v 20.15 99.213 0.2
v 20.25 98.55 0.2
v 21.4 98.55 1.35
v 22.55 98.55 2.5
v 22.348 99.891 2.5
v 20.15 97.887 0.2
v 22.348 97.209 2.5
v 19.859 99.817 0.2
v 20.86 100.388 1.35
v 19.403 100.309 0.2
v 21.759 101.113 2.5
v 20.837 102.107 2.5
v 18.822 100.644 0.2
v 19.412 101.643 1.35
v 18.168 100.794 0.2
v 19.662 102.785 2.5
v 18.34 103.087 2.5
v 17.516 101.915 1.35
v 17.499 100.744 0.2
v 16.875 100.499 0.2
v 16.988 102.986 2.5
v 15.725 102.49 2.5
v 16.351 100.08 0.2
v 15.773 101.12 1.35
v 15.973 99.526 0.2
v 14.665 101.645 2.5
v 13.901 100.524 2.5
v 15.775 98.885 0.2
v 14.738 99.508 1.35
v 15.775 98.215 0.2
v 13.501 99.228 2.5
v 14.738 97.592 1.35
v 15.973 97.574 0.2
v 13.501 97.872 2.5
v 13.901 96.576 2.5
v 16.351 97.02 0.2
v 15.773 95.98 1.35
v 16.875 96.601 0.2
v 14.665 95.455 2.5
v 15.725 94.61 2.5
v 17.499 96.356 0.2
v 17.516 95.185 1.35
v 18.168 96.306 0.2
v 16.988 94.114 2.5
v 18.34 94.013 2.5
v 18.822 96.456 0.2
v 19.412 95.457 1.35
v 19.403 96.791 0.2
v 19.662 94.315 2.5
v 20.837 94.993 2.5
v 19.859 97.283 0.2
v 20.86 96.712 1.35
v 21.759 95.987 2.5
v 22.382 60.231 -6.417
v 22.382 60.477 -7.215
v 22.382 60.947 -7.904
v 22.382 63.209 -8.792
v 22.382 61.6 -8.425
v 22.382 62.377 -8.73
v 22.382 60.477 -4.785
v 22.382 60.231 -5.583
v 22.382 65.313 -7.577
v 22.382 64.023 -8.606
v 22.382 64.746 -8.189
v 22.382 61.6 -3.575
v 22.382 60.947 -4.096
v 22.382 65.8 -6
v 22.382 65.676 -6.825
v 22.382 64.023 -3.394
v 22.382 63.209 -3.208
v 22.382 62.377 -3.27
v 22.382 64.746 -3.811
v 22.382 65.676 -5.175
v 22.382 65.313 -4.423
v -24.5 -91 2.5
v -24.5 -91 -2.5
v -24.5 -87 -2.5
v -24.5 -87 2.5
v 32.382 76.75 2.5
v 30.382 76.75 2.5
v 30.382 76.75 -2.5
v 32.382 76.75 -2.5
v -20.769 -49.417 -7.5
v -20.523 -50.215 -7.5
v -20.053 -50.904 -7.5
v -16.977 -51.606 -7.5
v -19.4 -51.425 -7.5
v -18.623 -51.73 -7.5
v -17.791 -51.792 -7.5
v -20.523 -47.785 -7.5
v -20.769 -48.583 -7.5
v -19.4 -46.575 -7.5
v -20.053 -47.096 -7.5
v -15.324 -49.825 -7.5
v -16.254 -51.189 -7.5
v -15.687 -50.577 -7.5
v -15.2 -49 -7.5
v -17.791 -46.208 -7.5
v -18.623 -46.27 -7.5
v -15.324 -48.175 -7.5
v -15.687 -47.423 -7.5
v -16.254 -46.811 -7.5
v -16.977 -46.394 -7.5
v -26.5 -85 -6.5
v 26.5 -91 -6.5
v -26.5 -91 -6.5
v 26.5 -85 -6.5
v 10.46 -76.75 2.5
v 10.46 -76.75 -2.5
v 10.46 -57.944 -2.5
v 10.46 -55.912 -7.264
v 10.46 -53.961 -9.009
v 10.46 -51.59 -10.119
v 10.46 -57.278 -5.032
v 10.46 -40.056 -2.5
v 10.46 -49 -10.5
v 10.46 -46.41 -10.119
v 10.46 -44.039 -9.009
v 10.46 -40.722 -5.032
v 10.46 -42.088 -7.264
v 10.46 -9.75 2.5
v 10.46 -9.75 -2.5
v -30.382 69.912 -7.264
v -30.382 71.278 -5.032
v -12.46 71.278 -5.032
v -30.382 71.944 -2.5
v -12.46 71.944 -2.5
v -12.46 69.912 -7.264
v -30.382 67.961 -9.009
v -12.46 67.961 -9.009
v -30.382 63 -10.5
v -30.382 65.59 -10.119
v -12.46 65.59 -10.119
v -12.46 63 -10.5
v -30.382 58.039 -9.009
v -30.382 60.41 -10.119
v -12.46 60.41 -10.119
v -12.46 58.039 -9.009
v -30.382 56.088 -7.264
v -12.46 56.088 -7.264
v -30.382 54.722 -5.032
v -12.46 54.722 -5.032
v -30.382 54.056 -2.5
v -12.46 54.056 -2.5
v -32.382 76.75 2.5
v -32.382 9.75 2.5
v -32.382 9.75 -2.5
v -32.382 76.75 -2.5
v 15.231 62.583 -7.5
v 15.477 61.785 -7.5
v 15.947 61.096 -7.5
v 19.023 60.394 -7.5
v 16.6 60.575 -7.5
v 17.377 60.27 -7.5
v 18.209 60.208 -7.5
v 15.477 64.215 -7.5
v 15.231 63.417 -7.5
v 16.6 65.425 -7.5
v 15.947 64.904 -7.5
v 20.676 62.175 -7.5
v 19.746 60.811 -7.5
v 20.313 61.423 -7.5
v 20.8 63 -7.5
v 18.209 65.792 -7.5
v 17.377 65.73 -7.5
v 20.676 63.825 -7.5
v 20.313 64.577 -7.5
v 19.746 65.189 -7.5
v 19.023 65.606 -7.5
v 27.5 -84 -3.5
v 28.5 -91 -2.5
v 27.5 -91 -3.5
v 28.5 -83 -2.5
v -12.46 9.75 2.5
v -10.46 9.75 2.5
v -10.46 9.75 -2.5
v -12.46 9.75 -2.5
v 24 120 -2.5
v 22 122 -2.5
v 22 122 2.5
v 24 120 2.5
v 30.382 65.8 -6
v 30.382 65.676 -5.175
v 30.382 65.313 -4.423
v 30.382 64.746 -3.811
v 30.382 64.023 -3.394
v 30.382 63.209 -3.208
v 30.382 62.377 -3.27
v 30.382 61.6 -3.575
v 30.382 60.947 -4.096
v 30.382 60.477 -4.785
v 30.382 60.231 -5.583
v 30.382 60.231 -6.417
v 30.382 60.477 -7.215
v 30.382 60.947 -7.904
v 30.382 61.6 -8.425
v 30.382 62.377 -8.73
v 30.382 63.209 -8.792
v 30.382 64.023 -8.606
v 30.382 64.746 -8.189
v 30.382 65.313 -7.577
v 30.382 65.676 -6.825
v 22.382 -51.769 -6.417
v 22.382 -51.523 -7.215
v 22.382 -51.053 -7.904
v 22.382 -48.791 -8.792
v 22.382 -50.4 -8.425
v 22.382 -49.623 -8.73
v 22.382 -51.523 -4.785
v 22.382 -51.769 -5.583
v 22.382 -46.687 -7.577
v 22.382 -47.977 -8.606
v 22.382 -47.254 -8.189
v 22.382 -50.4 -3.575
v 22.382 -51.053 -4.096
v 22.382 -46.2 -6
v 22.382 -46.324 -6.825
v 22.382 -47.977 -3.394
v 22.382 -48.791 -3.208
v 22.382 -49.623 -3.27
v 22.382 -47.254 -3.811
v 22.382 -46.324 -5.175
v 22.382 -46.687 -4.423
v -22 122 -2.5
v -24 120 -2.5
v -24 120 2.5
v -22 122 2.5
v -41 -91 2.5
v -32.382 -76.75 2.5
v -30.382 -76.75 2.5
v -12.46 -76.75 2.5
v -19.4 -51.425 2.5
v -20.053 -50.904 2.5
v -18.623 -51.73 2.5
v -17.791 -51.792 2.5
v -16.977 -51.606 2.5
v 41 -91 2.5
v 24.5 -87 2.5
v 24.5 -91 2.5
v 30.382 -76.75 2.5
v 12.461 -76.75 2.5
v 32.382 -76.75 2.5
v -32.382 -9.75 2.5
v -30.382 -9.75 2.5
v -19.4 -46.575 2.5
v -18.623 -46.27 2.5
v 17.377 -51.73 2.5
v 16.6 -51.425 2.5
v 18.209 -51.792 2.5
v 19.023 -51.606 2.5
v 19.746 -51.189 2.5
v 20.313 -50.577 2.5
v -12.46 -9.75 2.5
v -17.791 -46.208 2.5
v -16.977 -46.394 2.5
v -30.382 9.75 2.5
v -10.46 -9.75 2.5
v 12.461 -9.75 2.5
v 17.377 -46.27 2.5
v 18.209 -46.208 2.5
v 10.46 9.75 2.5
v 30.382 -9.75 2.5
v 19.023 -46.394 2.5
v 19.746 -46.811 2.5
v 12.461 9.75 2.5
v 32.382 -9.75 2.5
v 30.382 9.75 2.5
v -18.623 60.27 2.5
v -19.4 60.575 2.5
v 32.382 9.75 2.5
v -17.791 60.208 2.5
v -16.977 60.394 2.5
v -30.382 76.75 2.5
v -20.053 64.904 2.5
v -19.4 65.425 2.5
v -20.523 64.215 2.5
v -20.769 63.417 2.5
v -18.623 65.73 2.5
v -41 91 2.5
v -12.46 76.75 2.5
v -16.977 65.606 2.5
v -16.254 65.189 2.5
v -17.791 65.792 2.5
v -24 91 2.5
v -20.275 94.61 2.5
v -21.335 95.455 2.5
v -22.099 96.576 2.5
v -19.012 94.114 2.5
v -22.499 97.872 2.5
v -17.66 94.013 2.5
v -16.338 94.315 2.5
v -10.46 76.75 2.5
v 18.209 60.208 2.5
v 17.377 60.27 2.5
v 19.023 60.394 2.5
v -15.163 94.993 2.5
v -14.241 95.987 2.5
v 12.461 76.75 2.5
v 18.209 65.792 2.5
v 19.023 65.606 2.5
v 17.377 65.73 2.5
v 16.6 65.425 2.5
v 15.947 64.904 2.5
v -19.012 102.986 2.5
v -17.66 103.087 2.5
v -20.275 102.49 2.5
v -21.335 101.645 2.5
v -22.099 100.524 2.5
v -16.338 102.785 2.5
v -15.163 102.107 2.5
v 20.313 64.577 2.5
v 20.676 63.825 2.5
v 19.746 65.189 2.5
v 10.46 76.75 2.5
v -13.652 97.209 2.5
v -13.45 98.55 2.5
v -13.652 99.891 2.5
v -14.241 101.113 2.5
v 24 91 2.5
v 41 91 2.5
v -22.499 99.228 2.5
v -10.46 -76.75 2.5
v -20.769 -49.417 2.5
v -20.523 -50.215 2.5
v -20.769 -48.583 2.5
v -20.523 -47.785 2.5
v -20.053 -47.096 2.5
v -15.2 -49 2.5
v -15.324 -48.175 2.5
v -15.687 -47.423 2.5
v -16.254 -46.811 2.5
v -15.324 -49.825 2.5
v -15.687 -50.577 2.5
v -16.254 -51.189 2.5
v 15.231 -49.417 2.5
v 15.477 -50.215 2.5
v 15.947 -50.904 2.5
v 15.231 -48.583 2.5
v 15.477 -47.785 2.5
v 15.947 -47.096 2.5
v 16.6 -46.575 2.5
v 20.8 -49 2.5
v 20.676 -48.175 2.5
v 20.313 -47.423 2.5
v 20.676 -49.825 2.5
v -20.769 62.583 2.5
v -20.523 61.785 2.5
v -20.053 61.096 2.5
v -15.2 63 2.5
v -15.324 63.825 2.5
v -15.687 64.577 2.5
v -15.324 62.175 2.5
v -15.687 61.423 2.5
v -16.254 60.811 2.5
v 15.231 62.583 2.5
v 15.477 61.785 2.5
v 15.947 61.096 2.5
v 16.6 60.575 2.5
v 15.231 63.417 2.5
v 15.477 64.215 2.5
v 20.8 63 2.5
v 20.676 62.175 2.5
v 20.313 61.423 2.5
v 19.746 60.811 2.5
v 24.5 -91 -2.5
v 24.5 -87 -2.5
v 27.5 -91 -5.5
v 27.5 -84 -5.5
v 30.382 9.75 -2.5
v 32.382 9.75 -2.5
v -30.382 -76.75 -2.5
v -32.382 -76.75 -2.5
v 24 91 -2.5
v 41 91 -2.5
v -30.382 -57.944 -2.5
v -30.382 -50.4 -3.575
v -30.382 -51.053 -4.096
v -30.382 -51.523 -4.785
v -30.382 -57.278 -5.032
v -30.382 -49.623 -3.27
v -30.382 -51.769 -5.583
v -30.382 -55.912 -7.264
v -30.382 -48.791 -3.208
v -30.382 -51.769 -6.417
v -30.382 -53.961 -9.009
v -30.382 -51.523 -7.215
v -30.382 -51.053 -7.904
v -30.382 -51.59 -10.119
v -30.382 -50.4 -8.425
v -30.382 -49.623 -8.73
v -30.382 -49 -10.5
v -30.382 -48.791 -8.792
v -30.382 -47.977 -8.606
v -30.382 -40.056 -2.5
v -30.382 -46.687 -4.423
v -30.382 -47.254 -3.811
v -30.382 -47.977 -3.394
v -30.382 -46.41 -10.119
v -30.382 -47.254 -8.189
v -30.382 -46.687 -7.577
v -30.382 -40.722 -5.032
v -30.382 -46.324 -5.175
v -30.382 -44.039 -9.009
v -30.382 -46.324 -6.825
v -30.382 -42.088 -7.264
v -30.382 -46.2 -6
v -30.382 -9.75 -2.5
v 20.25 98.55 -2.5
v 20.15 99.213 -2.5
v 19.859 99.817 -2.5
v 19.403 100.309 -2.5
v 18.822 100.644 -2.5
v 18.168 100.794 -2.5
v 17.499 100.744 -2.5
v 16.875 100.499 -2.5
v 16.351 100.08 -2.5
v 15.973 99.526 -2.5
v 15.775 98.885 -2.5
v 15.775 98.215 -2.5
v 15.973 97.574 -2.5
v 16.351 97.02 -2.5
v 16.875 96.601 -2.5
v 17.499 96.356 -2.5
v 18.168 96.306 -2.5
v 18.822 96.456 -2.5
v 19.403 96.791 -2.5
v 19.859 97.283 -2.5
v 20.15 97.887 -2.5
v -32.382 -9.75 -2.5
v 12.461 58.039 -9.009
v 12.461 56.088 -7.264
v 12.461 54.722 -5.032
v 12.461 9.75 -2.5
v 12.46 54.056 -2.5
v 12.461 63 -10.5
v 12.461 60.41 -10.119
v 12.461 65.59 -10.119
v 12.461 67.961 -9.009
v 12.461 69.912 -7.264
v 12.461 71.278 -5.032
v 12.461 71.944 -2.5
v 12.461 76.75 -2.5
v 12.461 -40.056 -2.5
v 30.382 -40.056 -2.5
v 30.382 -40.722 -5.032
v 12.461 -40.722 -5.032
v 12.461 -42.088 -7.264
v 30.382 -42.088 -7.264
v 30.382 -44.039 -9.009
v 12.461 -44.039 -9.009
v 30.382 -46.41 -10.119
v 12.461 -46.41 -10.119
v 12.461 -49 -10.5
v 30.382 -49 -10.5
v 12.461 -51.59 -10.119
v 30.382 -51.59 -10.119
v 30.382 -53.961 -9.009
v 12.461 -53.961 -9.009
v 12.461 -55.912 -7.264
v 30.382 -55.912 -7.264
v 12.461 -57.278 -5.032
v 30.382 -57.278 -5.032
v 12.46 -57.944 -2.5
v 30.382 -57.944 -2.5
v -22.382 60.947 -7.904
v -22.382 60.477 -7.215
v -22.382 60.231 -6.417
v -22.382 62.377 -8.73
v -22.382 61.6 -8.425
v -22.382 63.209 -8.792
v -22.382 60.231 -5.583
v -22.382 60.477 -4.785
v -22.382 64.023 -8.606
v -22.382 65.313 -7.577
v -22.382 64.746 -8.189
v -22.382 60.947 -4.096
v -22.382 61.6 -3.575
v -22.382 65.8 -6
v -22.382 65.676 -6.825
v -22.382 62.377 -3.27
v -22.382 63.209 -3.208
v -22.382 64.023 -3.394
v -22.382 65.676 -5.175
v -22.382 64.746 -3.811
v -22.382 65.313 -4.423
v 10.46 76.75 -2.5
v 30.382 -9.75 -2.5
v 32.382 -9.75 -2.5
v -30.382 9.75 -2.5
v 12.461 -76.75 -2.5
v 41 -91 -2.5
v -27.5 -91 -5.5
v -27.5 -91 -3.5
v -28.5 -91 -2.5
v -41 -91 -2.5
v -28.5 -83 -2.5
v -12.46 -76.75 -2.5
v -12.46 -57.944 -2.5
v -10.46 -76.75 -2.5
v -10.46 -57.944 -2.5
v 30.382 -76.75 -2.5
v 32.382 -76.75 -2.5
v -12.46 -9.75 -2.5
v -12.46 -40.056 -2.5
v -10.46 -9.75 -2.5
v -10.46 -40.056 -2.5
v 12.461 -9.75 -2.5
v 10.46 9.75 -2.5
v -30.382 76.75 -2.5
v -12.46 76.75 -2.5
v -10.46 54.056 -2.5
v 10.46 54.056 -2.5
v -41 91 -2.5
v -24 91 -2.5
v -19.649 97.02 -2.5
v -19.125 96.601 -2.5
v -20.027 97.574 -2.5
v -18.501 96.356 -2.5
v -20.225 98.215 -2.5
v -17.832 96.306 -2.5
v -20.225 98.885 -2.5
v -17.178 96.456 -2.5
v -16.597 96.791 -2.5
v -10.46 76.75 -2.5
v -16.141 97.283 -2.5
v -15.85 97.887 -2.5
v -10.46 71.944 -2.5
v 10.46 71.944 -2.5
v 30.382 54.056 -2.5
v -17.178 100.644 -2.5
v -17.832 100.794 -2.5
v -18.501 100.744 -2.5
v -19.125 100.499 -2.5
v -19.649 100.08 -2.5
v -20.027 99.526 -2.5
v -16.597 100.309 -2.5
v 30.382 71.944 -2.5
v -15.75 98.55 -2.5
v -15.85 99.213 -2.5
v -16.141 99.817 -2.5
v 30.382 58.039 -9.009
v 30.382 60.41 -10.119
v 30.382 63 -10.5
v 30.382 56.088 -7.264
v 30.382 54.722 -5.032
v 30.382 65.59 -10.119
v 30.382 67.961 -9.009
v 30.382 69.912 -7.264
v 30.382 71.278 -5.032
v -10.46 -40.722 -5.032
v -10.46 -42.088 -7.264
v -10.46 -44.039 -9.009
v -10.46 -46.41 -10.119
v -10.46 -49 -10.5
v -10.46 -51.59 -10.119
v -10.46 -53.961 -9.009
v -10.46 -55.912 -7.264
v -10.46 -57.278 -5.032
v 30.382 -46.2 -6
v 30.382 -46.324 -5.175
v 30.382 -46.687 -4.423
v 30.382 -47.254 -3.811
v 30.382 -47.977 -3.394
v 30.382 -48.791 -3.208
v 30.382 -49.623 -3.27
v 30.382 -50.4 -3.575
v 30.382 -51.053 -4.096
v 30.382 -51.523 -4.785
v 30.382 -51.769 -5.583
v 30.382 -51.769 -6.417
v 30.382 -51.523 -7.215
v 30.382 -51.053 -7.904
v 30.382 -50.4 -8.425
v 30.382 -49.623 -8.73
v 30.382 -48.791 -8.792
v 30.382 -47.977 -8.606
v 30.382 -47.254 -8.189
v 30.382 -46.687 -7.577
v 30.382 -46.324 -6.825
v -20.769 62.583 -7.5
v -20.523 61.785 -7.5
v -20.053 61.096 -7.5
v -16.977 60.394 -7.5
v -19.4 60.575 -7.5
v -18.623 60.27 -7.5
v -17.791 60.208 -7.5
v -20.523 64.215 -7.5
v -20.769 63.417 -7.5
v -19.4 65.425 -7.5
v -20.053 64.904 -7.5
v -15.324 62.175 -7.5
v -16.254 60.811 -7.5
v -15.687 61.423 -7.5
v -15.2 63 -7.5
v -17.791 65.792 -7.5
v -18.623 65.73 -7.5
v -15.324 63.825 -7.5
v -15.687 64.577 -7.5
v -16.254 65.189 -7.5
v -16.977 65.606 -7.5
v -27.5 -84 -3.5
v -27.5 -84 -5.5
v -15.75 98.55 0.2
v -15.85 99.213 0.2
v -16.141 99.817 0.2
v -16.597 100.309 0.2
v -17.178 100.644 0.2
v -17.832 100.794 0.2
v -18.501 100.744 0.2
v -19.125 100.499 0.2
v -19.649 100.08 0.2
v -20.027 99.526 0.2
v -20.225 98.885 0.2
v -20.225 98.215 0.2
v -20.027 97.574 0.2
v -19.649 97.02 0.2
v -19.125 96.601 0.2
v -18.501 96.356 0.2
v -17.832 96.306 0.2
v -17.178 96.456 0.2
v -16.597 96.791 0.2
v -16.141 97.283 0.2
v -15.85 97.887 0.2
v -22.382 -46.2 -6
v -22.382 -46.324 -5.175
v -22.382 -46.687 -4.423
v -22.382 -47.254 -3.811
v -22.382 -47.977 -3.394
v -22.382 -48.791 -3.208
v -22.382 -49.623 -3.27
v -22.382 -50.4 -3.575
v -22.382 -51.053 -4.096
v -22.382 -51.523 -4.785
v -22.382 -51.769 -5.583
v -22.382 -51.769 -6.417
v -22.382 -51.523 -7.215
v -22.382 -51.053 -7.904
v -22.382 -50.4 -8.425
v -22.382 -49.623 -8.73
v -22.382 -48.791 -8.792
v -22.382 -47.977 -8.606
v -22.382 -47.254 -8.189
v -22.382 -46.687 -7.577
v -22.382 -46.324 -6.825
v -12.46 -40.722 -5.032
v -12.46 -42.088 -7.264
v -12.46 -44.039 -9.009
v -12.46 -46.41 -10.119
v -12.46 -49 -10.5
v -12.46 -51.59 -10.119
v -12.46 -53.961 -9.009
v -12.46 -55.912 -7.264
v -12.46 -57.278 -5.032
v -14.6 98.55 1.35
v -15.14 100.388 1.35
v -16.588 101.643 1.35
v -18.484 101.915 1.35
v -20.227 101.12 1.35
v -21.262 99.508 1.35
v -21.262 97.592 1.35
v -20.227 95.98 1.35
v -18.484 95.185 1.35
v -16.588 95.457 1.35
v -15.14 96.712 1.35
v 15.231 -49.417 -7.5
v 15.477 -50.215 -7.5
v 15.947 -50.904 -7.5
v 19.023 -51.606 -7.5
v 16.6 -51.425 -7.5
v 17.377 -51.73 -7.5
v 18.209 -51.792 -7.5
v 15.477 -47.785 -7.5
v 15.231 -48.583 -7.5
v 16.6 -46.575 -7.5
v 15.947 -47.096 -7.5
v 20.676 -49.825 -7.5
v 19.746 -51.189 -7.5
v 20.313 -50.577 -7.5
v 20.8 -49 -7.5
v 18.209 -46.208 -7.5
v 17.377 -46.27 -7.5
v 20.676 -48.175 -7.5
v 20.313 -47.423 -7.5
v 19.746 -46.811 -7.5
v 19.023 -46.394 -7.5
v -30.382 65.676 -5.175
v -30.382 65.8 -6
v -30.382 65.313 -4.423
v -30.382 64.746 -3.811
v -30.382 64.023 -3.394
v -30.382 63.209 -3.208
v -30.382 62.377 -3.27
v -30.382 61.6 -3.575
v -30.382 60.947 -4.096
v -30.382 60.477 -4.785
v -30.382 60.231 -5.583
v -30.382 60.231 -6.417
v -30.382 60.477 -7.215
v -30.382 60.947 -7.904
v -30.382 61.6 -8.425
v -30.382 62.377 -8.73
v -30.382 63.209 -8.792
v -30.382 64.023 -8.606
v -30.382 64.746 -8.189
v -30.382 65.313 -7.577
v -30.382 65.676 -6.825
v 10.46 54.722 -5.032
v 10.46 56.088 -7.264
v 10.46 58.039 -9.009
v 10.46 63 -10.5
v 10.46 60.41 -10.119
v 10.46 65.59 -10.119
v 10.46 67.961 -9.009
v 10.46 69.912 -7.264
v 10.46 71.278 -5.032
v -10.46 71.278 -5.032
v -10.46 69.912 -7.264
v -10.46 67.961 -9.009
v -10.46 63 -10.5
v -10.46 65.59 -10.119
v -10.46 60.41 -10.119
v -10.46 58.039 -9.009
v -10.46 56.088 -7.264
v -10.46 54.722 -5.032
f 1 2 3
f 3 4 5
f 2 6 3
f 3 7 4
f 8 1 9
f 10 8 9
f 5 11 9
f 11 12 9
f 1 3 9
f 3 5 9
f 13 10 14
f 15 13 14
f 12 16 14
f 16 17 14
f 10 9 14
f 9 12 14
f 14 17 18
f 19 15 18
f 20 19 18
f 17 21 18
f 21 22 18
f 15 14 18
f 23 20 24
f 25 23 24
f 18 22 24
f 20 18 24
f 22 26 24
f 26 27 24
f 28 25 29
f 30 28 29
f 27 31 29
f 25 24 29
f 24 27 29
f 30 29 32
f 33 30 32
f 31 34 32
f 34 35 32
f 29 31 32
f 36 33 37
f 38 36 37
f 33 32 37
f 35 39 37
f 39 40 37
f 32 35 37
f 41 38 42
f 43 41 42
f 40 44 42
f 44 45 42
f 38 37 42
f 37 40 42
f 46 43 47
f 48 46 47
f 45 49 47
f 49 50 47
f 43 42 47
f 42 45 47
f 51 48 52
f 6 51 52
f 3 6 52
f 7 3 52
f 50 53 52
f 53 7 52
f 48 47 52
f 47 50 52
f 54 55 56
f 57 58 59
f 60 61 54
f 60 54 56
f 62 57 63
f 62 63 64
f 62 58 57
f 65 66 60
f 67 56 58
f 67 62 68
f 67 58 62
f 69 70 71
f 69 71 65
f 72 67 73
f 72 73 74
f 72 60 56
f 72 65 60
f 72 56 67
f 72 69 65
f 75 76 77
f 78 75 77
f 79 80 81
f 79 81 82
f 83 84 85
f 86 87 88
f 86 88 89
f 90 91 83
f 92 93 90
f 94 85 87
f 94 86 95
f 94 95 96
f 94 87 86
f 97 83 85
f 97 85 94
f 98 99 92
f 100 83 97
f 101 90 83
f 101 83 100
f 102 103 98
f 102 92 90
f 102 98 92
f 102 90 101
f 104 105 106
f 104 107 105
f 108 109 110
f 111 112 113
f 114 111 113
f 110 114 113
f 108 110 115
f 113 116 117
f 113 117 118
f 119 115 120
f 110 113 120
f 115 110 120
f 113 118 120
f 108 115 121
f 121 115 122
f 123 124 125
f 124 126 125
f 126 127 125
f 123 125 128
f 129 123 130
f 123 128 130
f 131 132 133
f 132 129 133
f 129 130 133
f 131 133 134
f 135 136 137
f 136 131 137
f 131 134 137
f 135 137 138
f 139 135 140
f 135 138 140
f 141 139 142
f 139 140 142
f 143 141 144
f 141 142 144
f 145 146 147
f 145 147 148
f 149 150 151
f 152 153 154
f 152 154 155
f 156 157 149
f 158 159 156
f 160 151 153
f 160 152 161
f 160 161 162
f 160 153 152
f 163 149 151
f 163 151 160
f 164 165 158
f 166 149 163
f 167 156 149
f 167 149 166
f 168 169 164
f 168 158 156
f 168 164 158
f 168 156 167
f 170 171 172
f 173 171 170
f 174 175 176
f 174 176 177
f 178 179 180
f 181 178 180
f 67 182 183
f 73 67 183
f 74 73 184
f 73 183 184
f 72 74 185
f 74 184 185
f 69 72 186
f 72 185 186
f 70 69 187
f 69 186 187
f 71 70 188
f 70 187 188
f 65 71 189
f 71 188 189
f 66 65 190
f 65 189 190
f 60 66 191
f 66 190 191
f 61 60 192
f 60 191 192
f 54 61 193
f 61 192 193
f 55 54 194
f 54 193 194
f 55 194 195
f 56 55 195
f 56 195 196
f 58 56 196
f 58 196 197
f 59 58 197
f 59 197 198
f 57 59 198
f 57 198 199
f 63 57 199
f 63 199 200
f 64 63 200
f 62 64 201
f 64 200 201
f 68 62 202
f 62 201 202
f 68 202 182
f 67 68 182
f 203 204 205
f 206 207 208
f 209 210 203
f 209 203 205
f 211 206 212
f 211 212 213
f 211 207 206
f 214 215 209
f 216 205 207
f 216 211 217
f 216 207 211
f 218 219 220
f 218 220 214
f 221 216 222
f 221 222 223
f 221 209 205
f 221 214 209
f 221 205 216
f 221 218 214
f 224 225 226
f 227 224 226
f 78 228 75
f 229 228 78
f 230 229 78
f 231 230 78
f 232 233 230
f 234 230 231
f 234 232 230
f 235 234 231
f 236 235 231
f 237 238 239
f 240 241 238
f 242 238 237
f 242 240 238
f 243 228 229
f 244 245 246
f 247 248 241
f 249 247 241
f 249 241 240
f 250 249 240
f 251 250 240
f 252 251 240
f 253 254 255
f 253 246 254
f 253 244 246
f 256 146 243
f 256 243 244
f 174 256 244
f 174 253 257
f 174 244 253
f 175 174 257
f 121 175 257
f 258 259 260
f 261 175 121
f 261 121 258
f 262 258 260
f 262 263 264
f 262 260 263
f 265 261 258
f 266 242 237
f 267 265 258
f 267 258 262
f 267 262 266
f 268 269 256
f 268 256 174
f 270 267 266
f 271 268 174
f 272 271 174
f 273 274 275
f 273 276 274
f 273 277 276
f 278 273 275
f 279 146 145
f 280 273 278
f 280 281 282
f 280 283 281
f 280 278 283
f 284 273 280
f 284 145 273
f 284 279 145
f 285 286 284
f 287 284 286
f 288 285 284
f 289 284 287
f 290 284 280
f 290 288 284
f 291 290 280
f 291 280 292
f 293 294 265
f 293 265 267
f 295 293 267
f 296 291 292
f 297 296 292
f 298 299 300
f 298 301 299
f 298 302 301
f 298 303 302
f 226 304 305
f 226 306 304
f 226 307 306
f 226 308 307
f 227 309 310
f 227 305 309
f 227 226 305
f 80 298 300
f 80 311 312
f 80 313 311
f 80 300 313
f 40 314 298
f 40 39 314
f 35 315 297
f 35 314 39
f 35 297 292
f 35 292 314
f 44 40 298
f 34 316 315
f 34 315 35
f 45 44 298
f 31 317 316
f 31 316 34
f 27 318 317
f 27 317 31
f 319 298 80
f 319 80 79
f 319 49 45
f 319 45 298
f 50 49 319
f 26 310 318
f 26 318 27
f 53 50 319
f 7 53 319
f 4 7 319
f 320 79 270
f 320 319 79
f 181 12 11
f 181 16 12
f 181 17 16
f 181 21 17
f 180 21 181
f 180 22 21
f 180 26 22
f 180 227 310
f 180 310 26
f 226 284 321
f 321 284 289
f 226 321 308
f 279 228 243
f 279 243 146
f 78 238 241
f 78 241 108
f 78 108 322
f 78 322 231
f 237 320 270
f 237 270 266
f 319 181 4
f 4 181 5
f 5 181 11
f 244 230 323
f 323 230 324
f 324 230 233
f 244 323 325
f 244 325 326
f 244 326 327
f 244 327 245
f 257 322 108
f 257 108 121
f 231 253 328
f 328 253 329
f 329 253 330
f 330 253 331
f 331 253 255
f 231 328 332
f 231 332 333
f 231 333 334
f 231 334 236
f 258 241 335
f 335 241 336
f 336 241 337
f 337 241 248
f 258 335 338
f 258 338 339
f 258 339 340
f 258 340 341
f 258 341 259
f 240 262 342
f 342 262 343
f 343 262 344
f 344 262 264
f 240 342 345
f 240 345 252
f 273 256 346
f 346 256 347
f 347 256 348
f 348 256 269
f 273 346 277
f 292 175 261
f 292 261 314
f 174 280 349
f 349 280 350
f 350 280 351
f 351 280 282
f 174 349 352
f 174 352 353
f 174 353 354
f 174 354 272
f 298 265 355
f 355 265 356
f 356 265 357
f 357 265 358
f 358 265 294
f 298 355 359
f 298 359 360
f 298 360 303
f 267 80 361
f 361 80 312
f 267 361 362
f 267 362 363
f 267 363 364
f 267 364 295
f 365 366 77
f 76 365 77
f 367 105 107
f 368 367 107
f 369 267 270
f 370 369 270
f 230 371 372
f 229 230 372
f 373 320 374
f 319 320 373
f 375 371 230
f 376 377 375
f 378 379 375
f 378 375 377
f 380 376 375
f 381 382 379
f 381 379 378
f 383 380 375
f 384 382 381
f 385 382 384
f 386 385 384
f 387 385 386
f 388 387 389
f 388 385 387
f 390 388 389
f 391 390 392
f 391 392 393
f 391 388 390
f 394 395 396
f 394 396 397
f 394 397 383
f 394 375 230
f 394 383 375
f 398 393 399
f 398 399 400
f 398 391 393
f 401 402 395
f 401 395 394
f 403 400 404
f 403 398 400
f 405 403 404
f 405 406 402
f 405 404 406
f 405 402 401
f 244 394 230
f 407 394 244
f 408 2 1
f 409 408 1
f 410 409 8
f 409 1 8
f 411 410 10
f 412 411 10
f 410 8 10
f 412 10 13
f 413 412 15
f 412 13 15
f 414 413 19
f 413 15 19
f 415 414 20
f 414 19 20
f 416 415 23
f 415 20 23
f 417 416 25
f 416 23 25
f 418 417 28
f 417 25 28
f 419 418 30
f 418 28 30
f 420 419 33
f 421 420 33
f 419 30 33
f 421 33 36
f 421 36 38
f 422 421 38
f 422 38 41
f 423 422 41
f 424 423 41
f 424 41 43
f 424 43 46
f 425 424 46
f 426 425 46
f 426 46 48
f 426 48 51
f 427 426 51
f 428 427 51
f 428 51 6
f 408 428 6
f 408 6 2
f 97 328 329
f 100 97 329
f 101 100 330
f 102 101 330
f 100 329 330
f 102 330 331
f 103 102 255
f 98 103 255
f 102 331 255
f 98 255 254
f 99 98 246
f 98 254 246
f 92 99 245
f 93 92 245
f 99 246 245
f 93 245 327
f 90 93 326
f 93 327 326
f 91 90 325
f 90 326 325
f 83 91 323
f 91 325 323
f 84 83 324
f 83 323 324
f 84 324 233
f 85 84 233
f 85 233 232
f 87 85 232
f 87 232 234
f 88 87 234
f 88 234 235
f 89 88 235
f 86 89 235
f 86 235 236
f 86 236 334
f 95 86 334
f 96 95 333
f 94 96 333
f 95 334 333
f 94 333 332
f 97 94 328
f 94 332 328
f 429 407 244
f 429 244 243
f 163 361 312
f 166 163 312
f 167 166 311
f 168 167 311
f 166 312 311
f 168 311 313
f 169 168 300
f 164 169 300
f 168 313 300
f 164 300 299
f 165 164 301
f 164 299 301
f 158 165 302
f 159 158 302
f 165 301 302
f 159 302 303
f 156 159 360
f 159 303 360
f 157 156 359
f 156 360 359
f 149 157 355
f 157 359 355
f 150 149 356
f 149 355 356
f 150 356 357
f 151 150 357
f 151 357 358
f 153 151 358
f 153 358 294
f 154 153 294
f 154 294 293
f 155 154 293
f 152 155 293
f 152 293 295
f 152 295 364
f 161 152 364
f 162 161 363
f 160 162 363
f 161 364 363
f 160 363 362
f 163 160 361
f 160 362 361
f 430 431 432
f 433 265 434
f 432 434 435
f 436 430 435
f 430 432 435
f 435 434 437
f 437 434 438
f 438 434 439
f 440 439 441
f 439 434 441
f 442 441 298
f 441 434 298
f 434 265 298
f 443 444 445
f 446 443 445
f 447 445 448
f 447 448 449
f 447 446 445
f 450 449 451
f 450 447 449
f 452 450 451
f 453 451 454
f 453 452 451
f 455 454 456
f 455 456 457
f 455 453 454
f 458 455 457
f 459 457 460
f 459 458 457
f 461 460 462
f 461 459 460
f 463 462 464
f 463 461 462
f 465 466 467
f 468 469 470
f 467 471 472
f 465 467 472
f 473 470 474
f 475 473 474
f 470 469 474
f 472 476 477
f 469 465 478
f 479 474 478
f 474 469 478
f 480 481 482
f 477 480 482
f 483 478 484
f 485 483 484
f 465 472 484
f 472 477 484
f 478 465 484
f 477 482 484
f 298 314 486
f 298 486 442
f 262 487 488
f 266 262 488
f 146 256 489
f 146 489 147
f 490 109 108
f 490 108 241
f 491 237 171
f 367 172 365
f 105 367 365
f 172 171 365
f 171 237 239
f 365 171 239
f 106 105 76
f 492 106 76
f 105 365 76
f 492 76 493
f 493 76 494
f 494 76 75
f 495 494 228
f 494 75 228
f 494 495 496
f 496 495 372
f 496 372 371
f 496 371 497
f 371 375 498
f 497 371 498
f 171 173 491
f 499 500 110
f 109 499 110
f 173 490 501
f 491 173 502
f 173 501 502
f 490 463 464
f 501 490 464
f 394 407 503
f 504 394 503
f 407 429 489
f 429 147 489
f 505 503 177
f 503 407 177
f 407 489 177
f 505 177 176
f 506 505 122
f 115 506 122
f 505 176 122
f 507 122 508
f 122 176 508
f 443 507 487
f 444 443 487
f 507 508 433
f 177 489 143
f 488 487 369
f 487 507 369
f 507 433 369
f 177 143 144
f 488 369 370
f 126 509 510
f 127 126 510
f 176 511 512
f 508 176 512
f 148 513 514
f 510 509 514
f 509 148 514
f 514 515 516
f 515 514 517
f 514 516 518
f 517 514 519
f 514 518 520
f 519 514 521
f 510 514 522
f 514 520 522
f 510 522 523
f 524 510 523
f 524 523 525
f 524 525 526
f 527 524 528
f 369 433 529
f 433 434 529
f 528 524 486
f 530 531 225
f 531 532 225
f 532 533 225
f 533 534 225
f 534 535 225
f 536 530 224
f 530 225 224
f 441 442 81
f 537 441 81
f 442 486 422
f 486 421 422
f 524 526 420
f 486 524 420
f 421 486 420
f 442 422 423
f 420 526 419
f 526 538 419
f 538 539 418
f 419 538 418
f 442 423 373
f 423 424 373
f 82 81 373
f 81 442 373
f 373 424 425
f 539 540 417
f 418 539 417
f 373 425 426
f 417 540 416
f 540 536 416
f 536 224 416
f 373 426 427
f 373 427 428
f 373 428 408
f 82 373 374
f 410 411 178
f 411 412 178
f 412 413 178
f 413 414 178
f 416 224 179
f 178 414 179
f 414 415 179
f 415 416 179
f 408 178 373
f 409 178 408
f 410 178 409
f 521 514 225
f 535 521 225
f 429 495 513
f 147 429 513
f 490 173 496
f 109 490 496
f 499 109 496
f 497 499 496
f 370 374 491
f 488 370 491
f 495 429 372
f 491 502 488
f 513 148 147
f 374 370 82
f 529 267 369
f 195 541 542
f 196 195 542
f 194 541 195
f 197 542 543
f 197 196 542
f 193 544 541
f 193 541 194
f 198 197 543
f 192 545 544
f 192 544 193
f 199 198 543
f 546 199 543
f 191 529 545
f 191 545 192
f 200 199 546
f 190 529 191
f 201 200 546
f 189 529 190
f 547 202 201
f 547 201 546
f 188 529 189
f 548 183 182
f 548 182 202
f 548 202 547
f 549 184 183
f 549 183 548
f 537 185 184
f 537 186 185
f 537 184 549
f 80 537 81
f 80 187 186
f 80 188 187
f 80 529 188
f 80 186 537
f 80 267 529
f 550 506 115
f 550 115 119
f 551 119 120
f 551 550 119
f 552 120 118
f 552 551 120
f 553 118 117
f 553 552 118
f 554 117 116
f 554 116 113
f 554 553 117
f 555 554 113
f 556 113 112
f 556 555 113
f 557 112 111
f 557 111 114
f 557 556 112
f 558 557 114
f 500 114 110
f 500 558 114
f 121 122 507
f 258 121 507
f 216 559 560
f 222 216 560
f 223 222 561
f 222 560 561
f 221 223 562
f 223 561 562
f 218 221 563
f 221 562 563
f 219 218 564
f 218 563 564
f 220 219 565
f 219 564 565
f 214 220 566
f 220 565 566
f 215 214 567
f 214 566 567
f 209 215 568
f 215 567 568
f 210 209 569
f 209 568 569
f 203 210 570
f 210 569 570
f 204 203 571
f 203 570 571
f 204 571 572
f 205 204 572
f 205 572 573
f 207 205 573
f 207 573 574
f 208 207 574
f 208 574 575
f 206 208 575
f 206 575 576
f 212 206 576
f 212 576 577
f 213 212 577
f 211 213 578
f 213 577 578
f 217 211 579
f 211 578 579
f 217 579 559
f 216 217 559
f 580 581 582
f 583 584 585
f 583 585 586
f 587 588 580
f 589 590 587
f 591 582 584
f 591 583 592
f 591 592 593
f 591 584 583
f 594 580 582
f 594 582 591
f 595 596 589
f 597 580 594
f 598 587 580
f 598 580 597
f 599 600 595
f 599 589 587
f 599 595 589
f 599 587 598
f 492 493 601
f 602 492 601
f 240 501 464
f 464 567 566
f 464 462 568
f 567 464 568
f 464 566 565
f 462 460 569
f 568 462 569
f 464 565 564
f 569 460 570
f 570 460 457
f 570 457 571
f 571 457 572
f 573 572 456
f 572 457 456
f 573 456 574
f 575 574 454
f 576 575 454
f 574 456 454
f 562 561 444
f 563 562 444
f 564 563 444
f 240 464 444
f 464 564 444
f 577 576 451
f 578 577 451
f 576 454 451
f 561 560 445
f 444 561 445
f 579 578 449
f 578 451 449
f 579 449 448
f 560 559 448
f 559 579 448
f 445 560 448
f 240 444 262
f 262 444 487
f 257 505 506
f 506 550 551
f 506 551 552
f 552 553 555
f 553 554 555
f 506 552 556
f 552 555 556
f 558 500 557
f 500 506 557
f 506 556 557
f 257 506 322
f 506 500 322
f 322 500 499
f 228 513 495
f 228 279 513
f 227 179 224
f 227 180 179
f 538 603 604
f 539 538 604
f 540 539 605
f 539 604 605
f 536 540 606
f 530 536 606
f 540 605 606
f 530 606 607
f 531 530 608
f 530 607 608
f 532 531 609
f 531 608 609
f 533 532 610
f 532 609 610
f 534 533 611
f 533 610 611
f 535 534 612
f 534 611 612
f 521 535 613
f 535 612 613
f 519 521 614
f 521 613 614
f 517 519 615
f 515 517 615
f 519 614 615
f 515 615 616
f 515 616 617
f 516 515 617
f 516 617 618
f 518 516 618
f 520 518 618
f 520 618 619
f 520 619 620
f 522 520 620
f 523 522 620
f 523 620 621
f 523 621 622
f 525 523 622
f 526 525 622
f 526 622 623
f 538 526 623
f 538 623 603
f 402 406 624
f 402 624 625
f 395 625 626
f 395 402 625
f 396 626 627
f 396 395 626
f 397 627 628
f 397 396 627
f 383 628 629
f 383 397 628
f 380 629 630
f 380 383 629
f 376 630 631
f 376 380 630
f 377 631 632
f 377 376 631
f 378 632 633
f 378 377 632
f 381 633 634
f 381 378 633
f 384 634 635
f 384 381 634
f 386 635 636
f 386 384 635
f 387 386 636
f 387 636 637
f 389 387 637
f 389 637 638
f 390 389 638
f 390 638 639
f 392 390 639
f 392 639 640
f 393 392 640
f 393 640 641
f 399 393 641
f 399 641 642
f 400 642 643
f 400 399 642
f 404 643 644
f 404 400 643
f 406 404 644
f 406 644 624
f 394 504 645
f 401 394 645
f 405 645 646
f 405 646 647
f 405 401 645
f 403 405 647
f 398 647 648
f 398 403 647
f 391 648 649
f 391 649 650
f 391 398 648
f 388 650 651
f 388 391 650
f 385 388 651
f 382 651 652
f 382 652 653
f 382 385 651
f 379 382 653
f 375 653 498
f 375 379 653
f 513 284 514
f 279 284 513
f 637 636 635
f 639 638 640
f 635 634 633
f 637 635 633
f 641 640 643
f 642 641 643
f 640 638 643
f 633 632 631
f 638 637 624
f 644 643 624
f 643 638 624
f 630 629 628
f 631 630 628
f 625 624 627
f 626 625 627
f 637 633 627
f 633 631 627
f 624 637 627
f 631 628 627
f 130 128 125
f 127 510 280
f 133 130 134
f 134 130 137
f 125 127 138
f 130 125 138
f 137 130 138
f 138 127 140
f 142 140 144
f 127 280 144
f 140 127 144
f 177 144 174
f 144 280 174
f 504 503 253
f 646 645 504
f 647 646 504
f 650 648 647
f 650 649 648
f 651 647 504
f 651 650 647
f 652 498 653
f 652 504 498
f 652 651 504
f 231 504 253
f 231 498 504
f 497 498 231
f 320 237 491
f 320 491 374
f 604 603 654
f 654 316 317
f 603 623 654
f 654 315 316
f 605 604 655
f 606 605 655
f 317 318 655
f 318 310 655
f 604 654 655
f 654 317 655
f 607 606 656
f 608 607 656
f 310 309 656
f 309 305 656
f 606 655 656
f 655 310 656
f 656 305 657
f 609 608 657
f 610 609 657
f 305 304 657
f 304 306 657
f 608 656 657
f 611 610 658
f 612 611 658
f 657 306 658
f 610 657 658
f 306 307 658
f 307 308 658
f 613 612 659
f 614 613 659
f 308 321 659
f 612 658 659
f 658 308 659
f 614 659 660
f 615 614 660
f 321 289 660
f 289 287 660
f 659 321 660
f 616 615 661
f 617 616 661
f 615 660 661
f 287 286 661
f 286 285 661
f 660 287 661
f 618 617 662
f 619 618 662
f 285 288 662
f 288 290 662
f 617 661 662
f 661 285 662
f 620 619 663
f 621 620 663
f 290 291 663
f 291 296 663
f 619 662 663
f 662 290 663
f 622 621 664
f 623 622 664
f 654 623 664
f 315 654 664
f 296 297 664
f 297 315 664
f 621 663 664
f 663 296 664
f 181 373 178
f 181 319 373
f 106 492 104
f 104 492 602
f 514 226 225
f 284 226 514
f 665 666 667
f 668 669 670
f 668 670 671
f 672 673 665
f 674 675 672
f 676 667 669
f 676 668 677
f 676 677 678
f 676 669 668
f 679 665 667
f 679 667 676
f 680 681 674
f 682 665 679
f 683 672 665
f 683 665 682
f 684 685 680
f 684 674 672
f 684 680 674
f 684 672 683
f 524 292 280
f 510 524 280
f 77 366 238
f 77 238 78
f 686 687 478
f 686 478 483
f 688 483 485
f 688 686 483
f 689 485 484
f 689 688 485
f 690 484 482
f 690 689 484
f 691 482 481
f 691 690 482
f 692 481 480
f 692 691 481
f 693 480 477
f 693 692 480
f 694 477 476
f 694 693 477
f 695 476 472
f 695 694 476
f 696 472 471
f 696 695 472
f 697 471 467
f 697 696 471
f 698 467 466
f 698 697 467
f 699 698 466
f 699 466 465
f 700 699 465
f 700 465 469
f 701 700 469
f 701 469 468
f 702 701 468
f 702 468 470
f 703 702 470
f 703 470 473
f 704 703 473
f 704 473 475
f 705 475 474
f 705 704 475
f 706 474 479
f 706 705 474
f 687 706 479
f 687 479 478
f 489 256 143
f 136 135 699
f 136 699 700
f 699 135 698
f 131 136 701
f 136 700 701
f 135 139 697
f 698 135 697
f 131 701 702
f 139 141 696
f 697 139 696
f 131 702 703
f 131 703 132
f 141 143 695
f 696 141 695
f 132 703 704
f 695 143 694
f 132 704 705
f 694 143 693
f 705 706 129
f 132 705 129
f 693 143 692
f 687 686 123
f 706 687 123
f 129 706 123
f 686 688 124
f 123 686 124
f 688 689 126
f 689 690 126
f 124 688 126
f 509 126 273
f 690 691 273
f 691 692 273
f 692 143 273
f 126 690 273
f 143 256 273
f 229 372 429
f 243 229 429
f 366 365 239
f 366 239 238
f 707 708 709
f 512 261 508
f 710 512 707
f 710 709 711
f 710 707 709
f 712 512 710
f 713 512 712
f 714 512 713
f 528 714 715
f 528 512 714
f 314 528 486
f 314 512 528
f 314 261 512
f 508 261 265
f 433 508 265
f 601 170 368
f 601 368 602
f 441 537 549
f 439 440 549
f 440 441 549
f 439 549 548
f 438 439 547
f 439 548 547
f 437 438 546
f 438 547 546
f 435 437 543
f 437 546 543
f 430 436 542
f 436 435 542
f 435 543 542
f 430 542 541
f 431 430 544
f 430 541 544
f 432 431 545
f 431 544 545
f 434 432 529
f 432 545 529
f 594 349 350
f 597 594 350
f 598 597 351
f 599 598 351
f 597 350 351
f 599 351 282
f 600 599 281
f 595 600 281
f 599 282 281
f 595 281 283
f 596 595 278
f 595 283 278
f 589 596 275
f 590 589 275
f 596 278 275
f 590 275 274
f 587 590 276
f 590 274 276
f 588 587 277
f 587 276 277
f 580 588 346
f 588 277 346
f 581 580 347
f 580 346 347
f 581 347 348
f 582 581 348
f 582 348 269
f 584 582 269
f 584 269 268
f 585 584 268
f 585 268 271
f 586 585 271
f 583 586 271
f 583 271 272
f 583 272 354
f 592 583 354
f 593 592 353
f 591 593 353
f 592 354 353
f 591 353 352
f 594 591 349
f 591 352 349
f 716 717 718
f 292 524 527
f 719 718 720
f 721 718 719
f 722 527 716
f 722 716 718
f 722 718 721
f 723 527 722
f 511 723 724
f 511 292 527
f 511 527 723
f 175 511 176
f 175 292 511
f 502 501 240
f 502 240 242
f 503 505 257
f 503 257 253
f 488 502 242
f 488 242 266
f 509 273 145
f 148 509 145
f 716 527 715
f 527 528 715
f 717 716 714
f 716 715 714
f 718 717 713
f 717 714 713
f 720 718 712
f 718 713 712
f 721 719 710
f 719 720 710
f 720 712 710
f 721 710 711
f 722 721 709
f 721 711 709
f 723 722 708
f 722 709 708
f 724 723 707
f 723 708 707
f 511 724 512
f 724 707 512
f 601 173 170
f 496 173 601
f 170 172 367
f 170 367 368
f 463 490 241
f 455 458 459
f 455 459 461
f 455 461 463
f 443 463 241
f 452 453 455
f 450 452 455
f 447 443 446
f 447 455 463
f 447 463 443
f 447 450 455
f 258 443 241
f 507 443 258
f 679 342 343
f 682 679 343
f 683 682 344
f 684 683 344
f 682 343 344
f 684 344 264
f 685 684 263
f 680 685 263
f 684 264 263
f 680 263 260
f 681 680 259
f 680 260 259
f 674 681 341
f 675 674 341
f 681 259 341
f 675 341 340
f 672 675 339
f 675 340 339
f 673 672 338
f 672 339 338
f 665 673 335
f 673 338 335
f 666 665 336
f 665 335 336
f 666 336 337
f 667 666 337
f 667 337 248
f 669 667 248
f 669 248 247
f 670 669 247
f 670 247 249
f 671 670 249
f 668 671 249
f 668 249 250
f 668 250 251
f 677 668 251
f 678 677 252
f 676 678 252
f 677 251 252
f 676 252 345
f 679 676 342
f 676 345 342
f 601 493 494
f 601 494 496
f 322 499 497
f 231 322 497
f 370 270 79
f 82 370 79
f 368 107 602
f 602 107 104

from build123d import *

# Parameters (mm, degrees)
BOSS_EXTRU_1_DEPTH              = 2.5
BOSS_EXTRU_2_DEPTH              = 30.59
ESQUISSE5_W                     = 2
ESQUISSE5_H                     = 67
ENL_V_MAT_EXTRU_1_DEPTH         = 130.359962894
ESQUISSE14_W                    = 49
ESQUISSE14_H                    = 4
ENL_V_MAT_EXTRU_5_DEPTH         = 129.953479984
R_P_TITION_LIN_AIRE2_COUNT      = 2
R_P_TITION_LIN_AIRE2_PITCH      = 19.921
ESQUISSE17_R                    = 2.25
ENL_V_MAT_EXTRU_7_DEPTH         = 10
ESQUISSE15_W                    = 55
ESQUISSE15_H                    = 7
BOSS_EXTRU_4_DEPTH              = 4
CHANFREIN3_SIZE                 = 1
CHANFREIN4_SIZE                 = 2
ESQUISSE19_R                    = 2.8
ENL_V_MAT_EXTRU_9_DEPTH         = 8
CHANFREIN5_SIZE                 = 2.3
SYM_TRIE9_COPY_1_SKETCH_W       = 2
SYM_TRIE9_COPY_1_SKETCH_H       = 67
SYM_TRIE9_COPY_1_DEPTH          = 130.359962894
ESQUISSE20_R                    = 2.8
ENL_V_MAT_EXTRU_10_DEPTH        = 10
R_P_TITION_LIN_AIRE3_COUNT      = 2
R_P_TITION_LIN_AIRE3_PITCH      = 36
R_P_TITION_LIN_AIRE3_COUNT_DIR2 = 2
R_P_TITION_LIN_AIRE3_PITCH_DIR2 = 112


with BuildPart() as part:
    # Esquisse1 → Boss.-Extru.1 (new, symmetric)
    with BuildSketch(Plane.XY):
        Polygon((-41, -91), (-15.008, -91), (41, -91), (41, 91), (24, 91), (24, 122), (-24, 122), (-24, 91), (-41, 91), align=None)
    extrude(amount=BOSS_EXTRU_1_DEPTH, both=True)

    # Esquisse6 → Boss.-Extru.2 (add, symmetric)
    with BuildSketch(Plane(origin=(0, 0, 0), x_dir=(0, 0, -1), z_dir=(1, 0, 0))):
        with BuildLine():
            Line((2.5, -57.94427191), (2.5, -40.05572809))
            ThreePointArc((2.5, -40.05572809), (10.5, -49), (2.5, -57.94427191))
        make_face()
        with BuildLine():
            Line((2.5, 54.05572809), (2.5, 71.94427191))
            ThreePointArc((2.5, 71.94427191), (10.5, 63), (2.5, 54.05572809))
        make_face()
    extrude(amount=BOSS_EXTRU_2_DEPTH, both=True)

    # Esquisse5 → Enlèv. mat.-Extru.1 (cut, symmetric)
    with BuildSketch(Plane.XY.offset(2.5)):
        with Locations((31.3815, -43.25)):
            Rectangle(ESQUISSE5_W, ESQUISSE5_H)
        with Locations((31.3815, 43.25)):
            Rectangle(ESQUISSE5_W, ESQUISSE5_H)
    enl_v_mat_extru_1 = extrude(amount=ENL_V_MAT_EXTRU_1_DEPTH, both=True, mode=Mode.SUBTRACT)

    # Esquisse14 → Enlèv. mat.-Extru.5 (cut, through all)
    with BuildSketch(Plane(origin=(0, 0, -2.5), x_dir=(-1, 0, 0), z_dir=(0, 0, -1))):
        with Locations((0, -89)):
            Rectangle(ESQUISSE14_W, ESQUISSE14_H)
    extrude(amount=-ENL_V_MAT_EXTRU_5_DEPTH, mode=Mode.SUBTRACT)

    # Répétition linéaire2: Enlèv. mat.-Extru.1 ×2
    with Locations(*[(-i * R_P_TITION_LIN_AIRE2_PITCH, 0, 0) for i in range(1, R_P_TITION_LIN_AIRE2_COUNT)]):
        add(enl_v_mat_extru_1, mode=Mode.SUBTRACT)

    # Esquisse17 → Enlèv. mat.-Extru.7 (cut)
    with BuildSketch(Plane.XY.offset(2.5)):
        with Locations((18, 98.55)):
            Circle(ESQUISSE17_R)
        with Locations((-18, 98.55)):
            Circle(ESQUISSE17_R)
    extrude(amount=-ENL_V_MAT_EXTRU_7_DEPTH, mode=Mode.SUBTRACT)

    # Esquisse15 → Boss.-Extru.4 (add)
    with BuildSketch(Plane(origin=(0, 0, -2.5), x_dir=(-1, 0, 0), z_dir=(0, 0, -1))):
        with Locations((0, -87.5)):
            Rectangle(ESQUISSE15_W, ESQUISSE15_H)
    extrude(amount=BOSS_EXTRU_4_DEPTH)

    # Chanfrein3
    chanfrein3_edges = [part.edges().sort_by_distance(p)[0] for p in [
        (27.5, -87.5, -2.5),
        (-27.5, -87.5, -2.5),
        (0, -84, -2.5),
        (27.5, -87.5, -6.5),
        (-27.5, -87.5, -6.5),
        (0, -84, -6.5),
    ]]
    chamfer(chanfrein3_edges, length=CHANFREIN3_SIZE)

    # Chanfrein4
    chanfrein4_edges = [part.edges().sort_by_distance(p)[0] for p in [
        (-24, 122, 0),
        (24, 122, 0),
    ]]
    chamfer(chanfrein4_edges, length=CHANFREIN4_SIZE)

    # Esquisse19 → Enlèv. mat.-Extru.9 (cut)
    with BuildSketch(Plane(origin=(30.3815, 0, 0), x_dir=(0, 0, -1), z_dir=(1, 0, 0))):
        with Locations(Location((6, 63, 0), (0, 0, 90))):
            Circle(ESQUISSE19_R)
        with Locations(Location((6, -49, 0), (0, 0, 90))):
            Circle(ESQUISSE19_R)
    enl_v_mat_extru_9 = extrude(amount=-ENL_V_MAT_EXTRU_9_DEPTH, mode=Mode.SUBTRACT)

    # Symétrie8: Enlèv. mat.-Extru.9 across plane
    add(enl_v_mat_extru_9.mirror(Plane(origin=(0, 0, 0), x_dir=(0, 0, 1), z_dir=(1, 0, 0))), mode=Mode.SUBTRACT)

    # Chanfrein5
    chanfrein5_edges = [part.edges().sort_by_distance(p)[0] for p in [
        (15.75, 98.55, 2.5),
        (-20.25, 98.55, 2.5),
    ]]
    chamfer(chanfrein5_edges, length=CHANFREIN5_SIZE)

    # Symétrie9: Enlèv. mat.-Extru.1 across plane
    add(enl_v_mat_extru_1.mirror(Plane(origin=(0, 0, 0), x_dir=(0, 0, 1), z_dir=(1, 0, 0))), mode=Mode.SUBTRACT)

    # Symétrie9 copy 1 sketch → Symétrie9 copy 1 (cut, symmetric)
    with BuildSketch(Plane(origin=(19.921, 0, 2.5), x_dir=(-1, 0, 0), z_dir=(0, 0, 1))):
        with Locations((31.3815, 43.25)):
            Rectangle(SYM_TRIE9_COPY_1_SKETCH_W, SYM_TRIE9_COPY_1_SKETCH_H)
        with Locations((31.3815, -43.25)):
            Rectangle(SYM_TRIE9_COPY_1_SKETCH_W, SYM_TRIE9_COPY_1_SKETCH_H)
    extrude(amount=SYM_TRIE9_COPY_1_DEPTH, both=True, mode=Mode.SUBTRACT)

    # Esquisse20 → Enlèv. mat.-Extru.10 (cut)
    with BuildSketch(Plane.XY.offset(2.5)):
        with Locations((-18, -49)):
            Circle(ESQUISSE20_R)
    enl_v_mat_extru_10 = extrude(amount=-ENL_V_MAT_EXTRU_10_DEPTH, mode=Mode.SUBTRACT)

    # Répétition linéaire3: Enl_v. mat.-Extru.10 2 × 2
    with Locations(*[(i * R_P_TITION_LIN_AIRE3_PITCH, j * R_P_TITION_LIN_AIRE3_PITCH_DIR2, 0) for i in range(R_P_TITION_LIN_AIRE3_COUNT) for j in range(R_P_TITION_LIN_AIRE3_COUNT_DIR2) if (i, j) != (0, 0)]):
        add(enl_v_mat_extru_10, mode=Mode.SUBTRACT)


solid = part.part
